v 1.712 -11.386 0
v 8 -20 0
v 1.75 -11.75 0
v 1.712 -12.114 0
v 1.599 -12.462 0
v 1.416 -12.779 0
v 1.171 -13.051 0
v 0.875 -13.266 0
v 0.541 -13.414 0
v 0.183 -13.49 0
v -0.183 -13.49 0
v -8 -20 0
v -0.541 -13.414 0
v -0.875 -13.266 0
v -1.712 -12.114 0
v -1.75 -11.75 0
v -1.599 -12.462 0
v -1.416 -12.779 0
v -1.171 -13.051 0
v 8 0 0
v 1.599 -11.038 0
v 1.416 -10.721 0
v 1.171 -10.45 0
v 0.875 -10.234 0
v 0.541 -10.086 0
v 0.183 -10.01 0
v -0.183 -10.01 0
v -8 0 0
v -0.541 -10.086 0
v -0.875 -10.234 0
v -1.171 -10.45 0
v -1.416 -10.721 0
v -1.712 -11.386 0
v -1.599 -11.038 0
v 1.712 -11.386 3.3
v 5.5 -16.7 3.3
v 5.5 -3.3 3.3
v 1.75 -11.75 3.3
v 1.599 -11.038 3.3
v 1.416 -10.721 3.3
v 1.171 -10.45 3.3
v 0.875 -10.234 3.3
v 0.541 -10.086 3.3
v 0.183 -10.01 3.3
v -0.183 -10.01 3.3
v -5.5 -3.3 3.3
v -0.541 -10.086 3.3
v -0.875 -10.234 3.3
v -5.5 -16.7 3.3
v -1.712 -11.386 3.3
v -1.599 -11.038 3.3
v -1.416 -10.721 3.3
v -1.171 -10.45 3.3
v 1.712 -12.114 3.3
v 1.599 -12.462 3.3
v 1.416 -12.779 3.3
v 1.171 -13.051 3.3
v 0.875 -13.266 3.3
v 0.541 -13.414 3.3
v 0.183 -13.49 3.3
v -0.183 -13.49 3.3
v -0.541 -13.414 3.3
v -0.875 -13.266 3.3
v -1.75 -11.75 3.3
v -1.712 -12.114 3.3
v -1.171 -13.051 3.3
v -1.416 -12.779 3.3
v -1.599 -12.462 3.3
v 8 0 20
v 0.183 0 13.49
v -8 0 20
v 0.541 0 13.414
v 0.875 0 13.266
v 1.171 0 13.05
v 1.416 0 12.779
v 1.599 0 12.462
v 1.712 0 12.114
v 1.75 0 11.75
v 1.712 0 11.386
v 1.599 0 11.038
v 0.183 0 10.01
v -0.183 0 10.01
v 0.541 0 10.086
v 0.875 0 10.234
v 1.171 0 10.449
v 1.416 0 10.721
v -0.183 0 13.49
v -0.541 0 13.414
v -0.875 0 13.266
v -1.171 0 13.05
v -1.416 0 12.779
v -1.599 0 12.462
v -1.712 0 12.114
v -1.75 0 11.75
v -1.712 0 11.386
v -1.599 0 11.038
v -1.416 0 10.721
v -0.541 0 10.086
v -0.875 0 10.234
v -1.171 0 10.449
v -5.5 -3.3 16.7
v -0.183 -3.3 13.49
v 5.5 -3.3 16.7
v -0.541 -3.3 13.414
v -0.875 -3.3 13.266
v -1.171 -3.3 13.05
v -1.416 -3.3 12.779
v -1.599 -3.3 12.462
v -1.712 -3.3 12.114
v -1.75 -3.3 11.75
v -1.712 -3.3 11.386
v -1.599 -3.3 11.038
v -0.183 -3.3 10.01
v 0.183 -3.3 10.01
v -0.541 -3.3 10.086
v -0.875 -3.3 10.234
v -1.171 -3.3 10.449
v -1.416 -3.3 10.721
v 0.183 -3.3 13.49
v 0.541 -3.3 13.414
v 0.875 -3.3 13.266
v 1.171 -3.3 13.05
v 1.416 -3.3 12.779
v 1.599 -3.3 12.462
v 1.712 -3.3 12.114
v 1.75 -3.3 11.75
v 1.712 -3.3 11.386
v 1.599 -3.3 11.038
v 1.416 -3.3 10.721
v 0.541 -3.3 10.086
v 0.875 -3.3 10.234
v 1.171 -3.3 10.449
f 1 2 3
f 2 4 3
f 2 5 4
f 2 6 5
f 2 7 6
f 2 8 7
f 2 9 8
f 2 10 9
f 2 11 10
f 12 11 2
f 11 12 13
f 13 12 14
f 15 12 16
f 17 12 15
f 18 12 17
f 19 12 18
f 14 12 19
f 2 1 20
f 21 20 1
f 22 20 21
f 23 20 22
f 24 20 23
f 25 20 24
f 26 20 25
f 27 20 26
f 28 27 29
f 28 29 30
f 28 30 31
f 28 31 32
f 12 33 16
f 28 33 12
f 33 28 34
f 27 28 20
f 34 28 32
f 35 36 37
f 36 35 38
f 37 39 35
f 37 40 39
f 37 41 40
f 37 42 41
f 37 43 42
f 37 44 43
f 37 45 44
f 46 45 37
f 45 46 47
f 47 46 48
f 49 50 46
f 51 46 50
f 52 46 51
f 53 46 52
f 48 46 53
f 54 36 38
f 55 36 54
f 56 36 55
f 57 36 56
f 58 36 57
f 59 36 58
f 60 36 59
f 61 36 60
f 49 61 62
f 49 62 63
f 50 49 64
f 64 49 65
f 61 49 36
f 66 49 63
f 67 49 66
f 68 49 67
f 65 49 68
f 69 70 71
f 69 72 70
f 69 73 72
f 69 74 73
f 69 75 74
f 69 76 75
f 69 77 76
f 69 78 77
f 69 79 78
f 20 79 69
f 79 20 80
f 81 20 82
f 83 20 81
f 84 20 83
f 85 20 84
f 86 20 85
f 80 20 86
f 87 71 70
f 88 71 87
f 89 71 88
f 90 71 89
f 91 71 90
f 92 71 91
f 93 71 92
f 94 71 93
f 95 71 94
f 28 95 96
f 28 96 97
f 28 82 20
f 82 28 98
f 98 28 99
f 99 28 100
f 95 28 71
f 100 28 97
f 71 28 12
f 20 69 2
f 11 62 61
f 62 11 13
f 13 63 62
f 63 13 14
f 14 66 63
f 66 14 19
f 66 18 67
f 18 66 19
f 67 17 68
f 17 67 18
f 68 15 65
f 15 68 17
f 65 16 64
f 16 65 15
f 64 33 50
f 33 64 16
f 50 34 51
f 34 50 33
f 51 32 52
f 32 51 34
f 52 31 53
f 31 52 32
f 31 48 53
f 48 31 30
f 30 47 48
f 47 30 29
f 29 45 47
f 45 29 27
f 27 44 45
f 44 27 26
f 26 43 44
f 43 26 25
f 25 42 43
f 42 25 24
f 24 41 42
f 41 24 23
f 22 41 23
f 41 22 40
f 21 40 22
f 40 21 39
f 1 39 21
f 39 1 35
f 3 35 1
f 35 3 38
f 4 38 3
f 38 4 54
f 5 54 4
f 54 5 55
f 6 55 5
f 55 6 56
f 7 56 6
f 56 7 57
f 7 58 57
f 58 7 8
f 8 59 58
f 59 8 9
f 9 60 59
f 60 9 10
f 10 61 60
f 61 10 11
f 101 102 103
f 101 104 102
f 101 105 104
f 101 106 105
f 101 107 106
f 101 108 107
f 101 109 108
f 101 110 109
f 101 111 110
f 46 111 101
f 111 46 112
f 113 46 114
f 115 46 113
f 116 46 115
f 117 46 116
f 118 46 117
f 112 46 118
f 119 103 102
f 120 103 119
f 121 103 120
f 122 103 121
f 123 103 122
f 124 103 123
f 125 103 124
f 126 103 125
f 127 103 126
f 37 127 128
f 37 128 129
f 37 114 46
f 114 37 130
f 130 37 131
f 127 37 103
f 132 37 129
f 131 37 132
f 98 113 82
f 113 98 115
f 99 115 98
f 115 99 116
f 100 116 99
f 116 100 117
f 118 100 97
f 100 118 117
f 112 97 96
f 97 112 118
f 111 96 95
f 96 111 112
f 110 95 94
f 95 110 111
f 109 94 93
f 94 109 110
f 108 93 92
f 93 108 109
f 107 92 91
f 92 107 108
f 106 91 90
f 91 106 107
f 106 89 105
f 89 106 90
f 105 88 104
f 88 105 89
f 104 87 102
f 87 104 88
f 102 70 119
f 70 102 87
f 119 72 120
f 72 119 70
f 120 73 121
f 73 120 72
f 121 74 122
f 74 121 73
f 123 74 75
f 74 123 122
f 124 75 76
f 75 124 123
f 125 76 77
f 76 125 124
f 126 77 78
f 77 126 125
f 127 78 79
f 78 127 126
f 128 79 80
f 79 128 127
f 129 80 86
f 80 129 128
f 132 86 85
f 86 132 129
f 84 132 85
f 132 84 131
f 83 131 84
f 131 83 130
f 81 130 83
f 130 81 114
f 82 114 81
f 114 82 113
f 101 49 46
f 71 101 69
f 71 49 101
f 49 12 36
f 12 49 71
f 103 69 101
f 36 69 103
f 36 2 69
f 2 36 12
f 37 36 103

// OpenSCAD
thickness1=2.5;
thickness2=3.3;
hole=3.5;//diameter
$fs=0.1;

module angle_bracket_double()
{
    translate([-30/2,0,0]) intersection()
    {
        union()
        {
            linear_extrude(height=thickness2) translate([0,-20])  
            {
                difference()
                {
                    union()
                    {
                        square([30,20]);
                    }
                    {
                        translate([30/4+thickness1/4,20/2-hole/2]) circle(d=hole);
                        translate([30-(30+thickness1)/4,20/2-hole/2]) circle(d=hole);
                    }
                }
            }
            rotate([90,0,0]) linear_extrude(height=thickness2)
            {
                difference()
                {
                    union()
                    {
                        square([30,20]);
                    }
                    {
                        translate([30/4+thickness1/4,20/2+hole/2]) circle(d=hole);
                        translate([30-(30+thickness1)/4,20/2+hole/2]) circle(d=hole);
                    }
                }
            }
            
            translate([thickness1,0,0]) rotate([0,-90,0])
            linear_extrude(height=thickness1)
            polygon(points = [[0, 0],[0,-20],[20,0]]);

            translate([15,0,0]) rotate([0,-90,0])
            linear_extrude(height=thickness1,center=true)    
            polygon(points = [[0, 0],[0,-20],[20,0]]);

            translate([30,0,0]) rotate([0,-90,0])
            linear_extrude(height=thickness1)
            polygon(points = [[0, 0],[0,-20],[20,0]]);
        }
        
        translate([30,0,0]) rotate([0,-90,0])
        linear_extrude(height=30)
        polygon(points = [[0, 0],[0,-20],[20,0]]);
    }
}

module angle_bracket_simple()
{
    translate([-16/2,0,0]) intersection()
    {
        union()
        {
            linear_extrude(height=thickness2) translate([0,-20])  
            {
                difference()
                {
                    union()
                    {
                        square([16,20]);
                    }
                    {
                        translate([16/2,20/2-hole/2]) circle(d=hole);

                    }
                }
            }
            rotate([90,0,0]) linear_extrude(height=thickness2)
            {
                difference()
                {
                    union()
                    {
                        square([16,20]);
                    }
                    {
                        translate([16/2,20/2+hole/2]) circle(d=hole);
                    }
                }
            }
            
            translate([thickness1,0,0]) rotate([0,-90,0])
            linear_extrude(height=thickness1)
            polygon(points = [[0, 0],[0,-20],[20,0]]);

            translate([16,0,0]) rotate([0,-90,0])
            linear_extrude(height=thickness1)    
            polygon(points = [[0, 0],[0,-20],[20,0]]);

        }
        
        translate([16,0,0]) rotate([0,-90,0])
        linear_extrude(height=16)
        polygon(points = [[0, 0],[0,-20],[20,0]]);
    }
}
angle_bracket_simple();
*angle_bracket_double();
